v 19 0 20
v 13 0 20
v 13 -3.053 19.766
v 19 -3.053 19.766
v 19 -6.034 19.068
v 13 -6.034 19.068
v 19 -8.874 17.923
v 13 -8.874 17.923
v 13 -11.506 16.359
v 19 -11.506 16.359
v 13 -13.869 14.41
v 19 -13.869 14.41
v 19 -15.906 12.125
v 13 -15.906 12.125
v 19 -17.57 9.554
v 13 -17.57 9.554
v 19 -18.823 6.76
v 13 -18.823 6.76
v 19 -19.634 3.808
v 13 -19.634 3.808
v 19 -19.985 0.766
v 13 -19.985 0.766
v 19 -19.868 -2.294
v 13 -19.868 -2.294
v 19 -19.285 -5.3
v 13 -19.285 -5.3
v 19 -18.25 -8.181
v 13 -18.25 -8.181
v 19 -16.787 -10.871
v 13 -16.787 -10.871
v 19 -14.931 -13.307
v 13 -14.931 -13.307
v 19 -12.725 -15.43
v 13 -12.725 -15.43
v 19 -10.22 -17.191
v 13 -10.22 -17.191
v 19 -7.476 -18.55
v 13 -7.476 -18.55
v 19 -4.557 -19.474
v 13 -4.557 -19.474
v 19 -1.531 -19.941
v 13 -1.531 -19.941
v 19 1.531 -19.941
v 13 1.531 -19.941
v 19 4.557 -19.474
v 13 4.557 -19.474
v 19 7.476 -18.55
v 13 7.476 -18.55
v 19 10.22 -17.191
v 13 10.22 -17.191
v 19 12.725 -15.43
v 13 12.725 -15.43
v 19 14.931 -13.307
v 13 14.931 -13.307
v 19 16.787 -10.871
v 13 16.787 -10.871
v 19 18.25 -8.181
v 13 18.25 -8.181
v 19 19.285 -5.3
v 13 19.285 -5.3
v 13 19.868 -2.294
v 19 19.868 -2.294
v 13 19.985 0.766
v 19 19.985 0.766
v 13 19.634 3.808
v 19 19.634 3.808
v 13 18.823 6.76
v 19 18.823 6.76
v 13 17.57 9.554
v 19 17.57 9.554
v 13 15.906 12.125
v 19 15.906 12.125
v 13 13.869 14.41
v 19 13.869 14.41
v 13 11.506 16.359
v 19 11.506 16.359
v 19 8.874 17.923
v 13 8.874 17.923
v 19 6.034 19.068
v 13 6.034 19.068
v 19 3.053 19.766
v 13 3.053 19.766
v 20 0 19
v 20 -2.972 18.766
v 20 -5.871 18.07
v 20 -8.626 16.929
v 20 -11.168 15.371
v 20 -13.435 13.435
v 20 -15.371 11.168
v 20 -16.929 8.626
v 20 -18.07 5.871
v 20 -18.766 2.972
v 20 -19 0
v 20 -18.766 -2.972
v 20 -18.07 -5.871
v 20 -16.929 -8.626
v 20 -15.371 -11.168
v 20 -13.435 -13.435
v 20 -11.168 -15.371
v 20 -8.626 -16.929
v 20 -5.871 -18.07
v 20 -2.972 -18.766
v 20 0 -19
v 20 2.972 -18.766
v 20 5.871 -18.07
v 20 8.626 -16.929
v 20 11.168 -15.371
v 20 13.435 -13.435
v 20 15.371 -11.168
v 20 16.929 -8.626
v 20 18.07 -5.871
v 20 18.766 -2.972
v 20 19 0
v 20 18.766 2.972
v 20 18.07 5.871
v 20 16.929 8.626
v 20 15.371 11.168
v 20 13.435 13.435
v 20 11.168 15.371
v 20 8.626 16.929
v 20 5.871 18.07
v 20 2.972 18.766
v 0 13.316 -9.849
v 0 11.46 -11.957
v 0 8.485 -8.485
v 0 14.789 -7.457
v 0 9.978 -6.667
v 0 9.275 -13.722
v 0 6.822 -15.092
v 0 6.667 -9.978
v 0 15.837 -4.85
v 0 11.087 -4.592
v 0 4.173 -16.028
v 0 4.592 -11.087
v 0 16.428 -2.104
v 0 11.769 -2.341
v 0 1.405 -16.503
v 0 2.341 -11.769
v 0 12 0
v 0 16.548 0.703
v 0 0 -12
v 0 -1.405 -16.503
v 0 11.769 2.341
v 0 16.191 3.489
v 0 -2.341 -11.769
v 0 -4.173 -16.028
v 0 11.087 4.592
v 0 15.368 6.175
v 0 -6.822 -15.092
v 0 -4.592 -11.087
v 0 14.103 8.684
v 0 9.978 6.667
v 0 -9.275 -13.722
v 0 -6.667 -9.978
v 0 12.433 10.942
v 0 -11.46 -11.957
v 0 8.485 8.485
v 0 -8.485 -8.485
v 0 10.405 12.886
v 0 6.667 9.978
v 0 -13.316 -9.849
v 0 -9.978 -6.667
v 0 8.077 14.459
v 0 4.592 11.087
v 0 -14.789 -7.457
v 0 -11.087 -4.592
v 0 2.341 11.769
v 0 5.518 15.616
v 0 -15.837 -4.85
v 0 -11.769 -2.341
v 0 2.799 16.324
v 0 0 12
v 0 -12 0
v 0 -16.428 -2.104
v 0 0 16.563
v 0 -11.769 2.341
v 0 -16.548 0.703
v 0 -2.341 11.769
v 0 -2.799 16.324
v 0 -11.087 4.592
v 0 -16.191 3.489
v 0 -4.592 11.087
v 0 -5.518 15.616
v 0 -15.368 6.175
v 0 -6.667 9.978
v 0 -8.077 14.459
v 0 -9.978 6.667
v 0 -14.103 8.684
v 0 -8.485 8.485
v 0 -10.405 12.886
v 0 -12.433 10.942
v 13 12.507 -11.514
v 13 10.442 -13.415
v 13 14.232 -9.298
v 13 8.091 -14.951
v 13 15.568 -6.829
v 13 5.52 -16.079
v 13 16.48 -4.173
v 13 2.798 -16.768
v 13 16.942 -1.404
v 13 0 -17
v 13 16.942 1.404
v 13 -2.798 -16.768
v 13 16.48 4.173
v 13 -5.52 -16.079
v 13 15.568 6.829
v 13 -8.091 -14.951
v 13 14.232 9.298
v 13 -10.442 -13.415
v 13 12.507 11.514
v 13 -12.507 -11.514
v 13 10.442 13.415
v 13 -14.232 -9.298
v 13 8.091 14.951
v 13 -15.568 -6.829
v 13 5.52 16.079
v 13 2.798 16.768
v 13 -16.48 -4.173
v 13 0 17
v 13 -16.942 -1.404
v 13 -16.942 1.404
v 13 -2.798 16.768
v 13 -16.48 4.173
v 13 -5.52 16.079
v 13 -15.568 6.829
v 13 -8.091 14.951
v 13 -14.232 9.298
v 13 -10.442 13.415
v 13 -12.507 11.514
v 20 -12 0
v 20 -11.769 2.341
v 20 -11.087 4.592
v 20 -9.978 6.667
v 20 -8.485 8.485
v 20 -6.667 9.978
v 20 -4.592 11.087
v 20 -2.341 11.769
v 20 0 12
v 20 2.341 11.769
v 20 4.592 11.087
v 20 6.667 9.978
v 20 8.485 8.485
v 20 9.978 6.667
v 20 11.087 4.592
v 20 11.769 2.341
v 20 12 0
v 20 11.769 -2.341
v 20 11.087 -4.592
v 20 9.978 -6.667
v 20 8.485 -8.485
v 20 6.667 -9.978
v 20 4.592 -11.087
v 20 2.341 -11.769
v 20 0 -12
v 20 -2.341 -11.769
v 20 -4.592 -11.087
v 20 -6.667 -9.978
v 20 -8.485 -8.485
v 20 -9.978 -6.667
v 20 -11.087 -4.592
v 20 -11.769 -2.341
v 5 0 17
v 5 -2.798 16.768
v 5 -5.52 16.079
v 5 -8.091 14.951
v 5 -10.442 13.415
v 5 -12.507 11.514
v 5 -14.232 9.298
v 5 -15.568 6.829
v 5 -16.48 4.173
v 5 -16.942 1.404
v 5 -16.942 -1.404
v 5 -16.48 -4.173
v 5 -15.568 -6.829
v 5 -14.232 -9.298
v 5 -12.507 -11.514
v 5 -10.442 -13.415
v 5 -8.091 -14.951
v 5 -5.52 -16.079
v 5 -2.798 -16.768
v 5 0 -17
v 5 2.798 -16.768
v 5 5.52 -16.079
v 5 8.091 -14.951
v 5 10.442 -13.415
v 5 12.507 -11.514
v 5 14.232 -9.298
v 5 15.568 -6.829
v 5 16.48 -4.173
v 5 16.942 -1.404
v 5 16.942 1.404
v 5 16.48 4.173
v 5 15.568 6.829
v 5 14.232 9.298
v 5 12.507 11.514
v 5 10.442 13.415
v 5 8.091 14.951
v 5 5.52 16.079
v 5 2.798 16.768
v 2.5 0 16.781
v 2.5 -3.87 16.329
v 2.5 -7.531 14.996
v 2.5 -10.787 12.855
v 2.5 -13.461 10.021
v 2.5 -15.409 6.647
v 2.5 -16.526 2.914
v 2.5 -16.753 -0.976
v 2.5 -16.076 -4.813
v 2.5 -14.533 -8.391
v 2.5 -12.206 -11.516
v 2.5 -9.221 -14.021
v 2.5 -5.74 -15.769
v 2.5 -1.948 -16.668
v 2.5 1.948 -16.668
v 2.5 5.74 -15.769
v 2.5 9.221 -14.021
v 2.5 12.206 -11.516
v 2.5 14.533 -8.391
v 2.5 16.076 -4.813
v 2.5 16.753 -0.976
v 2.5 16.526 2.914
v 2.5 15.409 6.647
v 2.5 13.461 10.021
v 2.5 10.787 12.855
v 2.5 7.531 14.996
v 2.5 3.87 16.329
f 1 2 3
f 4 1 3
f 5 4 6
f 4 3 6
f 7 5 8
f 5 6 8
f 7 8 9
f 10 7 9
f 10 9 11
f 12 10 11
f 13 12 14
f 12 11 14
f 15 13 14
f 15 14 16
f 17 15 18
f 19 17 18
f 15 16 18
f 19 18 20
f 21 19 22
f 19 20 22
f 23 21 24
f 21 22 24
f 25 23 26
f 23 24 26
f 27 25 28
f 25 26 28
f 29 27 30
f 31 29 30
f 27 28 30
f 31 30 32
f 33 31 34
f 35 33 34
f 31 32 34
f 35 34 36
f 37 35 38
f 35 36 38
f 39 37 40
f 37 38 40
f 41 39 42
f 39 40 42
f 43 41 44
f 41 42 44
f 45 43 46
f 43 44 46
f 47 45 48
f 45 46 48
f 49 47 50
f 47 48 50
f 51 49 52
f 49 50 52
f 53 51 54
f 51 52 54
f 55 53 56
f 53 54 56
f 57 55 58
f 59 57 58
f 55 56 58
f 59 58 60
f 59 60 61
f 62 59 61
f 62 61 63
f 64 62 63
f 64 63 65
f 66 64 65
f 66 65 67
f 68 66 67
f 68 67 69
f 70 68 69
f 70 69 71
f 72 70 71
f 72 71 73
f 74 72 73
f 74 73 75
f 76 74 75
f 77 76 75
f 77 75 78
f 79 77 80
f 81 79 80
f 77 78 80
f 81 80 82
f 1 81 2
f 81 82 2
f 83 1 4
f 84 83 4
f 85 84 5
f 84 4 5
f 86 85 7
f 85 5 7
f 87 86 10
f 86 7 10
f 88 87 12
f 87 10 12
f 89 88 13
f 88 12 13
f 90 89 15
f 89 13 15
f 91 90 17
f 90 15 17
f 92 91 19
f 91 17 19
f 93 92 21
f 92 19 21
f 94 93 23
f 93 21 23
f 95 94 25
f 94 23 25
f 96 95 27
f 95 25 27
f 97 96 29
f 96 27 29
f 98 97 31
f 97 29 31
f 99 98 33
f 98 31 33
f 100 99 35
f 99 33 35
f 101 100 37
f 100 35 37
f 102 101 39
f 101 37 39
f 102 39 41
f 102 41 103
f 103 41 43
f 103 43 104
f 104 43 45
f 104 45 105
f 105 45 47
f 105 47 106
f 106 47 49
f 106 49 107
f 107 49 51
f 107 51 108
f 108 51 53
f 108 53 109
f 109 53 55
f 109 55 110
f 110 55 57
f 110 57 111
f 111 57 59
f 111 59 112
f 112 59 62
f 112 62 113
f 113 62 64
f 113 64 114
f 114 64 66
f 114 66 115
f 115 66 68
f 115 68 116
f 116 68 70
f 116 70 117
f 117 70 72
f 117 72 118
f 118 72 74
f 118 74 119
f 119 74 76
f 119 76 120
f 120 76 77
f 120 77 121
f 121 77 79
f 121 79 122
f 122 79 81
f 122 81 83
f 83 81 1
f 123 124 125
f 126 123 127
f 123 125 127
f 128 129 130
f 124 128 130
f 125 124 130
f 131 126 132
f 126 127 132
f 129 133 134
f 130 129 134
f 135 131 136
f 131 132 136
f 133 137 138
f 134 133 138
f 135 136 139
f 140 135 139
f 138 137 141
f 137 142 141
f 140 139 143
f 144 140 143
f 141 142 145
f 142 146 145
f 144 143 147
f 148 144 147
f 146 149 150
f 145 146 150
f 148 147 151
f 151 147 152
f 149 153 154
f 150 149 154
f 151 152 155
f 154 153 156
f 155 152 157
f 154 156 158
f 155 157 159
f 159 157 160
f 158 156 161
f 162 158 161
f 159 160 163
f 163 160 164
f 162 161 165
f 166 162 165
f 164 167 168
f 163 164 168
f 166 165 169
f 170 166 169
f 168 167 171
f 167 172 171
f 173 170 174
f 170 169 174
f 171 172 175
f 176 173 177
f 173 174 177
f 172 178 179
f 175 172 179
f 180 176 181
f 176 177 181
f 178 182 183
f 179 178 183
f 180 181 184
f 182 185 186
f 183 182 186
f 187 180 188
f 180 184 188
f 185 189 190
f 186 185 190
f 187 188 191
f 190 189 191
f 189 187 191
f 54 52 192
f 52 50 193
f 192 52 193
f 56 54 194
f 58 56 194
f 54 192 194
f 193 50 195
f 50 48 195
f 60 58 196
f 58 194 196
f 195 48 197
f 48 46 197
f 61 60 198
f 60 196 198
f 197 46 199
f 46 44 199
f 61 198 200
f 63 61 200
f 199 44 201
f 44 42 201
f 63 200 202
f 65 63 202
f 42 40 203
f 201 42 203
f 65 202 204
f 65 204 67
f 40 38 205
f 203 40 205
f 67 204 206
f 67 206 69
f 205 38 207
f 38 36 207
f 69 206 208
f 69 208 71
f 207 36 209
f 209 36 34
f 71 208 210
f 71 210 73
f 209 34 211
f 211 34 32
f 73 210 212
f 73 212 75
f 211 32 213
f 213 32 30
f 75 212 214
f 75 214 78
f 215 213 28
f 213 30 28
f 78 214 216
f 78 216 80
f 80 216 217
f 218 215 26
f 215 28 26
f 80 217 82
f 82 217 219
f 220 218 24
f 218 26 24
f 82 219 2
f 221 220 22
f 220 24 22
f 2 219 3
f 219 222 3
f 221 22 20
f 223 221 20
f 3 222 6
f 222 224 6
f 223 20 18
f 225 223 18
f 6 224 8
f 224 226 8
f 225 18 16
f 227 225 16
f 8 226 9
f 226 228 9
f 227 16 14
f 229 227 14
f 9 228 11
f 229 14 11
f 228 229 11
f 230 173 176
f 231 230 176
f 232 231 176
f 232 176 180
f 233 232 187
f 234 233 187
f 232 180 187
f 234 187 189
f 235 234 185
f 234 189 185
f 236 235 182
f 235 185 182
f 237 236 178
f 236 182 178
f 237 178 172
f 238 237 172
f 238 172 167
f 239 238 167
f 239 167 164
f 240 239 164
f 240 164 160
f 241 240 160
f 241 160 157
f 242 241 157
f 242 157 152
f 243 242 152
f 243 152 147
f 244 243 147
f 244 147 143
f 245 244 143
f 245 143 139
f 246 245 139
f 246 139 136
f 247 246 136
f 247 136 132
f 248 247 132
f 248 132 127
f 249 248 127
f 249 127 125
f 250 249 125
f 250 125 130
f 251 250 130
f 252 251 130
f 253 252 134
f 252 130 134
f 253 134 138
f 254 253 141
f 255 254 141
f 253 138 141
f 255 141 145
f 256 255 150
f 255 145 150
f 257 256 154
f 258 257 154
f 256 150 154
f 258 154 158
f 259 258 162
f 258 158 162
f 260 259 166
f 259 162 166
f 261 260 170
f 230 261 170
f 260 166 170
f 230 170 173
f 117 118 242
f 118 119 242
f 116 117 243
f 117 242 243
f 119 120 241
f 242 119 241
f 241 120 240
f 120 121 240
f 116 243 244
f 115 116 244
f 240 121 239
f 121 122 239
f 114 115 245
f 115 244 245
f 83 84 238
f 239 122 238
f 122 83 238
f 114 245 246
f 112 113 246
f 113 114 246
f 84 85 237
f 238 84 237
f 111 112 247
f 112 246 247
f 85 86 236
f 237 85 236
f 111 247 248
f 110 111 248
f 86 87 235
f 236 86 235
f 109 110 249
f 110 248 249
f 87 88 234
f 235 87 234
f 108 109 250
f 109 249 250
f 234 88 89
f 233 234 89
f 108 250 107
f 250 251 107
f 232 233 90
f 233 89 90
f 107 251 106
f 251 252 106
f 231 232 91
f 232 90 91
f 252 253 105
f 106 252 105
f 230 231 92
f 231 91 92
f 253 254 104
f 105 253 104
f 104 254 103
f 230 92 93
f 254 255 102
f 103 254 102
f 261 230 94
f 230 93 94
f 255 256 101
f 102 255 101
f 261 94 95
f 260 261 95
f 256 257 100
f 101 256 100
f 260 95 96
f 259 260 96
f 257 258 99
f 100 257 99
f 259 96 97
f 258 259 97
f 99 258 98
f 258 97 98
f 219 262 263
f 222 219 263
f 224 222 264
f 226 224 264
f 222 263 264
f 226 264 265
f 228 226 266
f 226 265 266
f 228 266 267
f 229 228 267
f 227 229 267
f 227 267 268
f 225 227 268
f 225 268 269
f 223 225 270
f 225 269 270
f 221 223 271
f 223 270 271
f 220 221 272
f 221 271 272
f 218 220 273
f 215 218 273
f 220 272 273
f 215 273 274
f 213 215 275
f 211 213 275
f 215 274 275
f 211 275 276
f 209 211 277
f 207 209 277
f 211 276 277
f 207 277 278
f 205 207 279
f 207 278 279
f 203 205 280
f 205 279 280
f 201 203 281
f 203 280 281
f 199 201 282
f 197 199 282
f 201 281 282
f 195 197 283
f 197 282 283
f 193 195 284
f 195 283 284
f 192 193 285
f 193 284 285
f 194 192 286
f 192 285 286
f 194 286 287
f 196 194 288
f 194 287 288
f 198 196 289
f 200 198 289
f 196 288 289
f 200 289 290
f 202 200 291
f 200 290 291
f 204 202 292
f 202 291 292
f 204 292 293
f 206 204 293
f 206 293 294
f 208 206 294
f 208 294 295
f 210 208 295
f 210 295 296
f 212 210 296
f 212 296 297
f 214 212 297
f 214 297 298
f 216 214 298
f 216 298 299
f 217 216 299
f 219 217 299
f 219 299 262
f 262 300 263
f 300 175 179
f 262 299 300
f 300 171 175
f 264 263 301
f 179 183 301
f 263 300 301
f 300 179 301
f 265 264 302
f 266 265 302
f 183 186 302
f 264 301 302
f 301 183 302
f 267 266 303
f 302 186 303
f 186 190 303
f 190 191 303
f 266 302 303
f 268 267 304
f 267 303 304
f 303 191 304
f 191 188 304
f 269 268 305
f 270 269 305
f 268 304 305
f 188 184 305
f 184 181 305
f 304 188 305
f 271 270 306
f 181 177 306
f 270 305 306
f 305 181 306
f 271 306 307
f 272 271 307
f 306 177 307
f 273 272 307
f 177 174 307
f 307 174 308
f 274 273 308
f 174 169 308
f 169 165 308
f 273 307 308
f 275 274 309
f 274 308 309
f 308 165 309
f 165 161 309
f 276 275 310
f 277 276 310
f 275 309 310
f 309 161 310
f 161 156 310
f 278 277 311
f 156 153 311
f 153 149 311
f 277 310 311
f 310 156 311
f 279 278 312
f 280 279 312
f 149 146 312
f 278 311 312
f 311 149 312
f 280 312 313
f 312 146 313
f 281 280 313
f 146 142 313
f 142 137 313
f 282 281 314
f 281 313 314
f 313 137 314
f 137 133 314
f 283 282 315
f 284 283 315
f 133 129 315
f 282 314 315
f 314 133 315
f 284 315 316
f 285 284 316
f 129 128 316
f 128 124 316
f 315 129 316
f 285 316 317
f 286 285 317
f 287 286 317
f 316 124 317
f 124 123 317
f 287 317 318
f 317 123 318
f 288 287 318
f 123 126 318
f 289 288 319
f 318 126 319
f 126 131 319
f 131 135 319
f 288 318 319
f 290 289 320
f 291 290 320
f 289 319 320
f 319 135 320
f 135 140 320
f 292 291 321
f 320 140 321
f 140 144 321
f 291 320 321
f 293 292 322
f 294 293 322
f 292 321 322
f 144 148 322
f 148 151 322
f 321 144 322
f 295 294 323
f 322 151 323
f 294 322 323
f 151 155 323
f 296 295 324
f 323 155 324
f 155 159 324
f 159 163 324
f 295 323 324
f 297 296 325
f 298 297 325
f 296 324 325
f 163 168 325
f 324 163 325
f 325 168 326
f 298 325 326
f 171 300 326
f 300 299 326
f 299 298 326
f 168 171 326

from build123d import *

# Parameters (mm, degrees)
F2_SIZE  = 1
F3_SIZE2 = 0.437443
F3_SIZE  = 5
F4_R     = 12
F5_DEPTH = 69.3


with BuildPart() as f1:
    # F0 (on Front) → F1 (revolve)
    with BuildSketch(Plane.XZ):
        Polygon((0, 17), (0, 0), (20, 0), (20, 20), (13, 20), (13, 17), align=None)
    revolve(axis=Axis((10, 0, 0), (1, 0, 0)))

    # F2
    f2_edges = [f1.edges().sort_by_distance(p)[0] for p in [
        (20, 0, -20),
    ]]
    chamfer(f2_edges, length=F2_SIZE)

    # F3
    f3_edges = [f1.edges().sort_by_distance(p)[0] for p in [
        (0, 0, -17),
    ]]
    chamfer(f3_edges, length=F3_SIZE, length2=F3_SIZE2)

    # F4 (on face) → F5 (cut)
    with BuildSketch(Plane(origin=(0, 0, 0), x_dir=(0, -1, 0), z_dir=(-1, 0, 0))):
        Circle(F4_R)
    extrude(amount=-F5_DEPTH, mode=Mode.SUBTRACT)


solid = f1.part
